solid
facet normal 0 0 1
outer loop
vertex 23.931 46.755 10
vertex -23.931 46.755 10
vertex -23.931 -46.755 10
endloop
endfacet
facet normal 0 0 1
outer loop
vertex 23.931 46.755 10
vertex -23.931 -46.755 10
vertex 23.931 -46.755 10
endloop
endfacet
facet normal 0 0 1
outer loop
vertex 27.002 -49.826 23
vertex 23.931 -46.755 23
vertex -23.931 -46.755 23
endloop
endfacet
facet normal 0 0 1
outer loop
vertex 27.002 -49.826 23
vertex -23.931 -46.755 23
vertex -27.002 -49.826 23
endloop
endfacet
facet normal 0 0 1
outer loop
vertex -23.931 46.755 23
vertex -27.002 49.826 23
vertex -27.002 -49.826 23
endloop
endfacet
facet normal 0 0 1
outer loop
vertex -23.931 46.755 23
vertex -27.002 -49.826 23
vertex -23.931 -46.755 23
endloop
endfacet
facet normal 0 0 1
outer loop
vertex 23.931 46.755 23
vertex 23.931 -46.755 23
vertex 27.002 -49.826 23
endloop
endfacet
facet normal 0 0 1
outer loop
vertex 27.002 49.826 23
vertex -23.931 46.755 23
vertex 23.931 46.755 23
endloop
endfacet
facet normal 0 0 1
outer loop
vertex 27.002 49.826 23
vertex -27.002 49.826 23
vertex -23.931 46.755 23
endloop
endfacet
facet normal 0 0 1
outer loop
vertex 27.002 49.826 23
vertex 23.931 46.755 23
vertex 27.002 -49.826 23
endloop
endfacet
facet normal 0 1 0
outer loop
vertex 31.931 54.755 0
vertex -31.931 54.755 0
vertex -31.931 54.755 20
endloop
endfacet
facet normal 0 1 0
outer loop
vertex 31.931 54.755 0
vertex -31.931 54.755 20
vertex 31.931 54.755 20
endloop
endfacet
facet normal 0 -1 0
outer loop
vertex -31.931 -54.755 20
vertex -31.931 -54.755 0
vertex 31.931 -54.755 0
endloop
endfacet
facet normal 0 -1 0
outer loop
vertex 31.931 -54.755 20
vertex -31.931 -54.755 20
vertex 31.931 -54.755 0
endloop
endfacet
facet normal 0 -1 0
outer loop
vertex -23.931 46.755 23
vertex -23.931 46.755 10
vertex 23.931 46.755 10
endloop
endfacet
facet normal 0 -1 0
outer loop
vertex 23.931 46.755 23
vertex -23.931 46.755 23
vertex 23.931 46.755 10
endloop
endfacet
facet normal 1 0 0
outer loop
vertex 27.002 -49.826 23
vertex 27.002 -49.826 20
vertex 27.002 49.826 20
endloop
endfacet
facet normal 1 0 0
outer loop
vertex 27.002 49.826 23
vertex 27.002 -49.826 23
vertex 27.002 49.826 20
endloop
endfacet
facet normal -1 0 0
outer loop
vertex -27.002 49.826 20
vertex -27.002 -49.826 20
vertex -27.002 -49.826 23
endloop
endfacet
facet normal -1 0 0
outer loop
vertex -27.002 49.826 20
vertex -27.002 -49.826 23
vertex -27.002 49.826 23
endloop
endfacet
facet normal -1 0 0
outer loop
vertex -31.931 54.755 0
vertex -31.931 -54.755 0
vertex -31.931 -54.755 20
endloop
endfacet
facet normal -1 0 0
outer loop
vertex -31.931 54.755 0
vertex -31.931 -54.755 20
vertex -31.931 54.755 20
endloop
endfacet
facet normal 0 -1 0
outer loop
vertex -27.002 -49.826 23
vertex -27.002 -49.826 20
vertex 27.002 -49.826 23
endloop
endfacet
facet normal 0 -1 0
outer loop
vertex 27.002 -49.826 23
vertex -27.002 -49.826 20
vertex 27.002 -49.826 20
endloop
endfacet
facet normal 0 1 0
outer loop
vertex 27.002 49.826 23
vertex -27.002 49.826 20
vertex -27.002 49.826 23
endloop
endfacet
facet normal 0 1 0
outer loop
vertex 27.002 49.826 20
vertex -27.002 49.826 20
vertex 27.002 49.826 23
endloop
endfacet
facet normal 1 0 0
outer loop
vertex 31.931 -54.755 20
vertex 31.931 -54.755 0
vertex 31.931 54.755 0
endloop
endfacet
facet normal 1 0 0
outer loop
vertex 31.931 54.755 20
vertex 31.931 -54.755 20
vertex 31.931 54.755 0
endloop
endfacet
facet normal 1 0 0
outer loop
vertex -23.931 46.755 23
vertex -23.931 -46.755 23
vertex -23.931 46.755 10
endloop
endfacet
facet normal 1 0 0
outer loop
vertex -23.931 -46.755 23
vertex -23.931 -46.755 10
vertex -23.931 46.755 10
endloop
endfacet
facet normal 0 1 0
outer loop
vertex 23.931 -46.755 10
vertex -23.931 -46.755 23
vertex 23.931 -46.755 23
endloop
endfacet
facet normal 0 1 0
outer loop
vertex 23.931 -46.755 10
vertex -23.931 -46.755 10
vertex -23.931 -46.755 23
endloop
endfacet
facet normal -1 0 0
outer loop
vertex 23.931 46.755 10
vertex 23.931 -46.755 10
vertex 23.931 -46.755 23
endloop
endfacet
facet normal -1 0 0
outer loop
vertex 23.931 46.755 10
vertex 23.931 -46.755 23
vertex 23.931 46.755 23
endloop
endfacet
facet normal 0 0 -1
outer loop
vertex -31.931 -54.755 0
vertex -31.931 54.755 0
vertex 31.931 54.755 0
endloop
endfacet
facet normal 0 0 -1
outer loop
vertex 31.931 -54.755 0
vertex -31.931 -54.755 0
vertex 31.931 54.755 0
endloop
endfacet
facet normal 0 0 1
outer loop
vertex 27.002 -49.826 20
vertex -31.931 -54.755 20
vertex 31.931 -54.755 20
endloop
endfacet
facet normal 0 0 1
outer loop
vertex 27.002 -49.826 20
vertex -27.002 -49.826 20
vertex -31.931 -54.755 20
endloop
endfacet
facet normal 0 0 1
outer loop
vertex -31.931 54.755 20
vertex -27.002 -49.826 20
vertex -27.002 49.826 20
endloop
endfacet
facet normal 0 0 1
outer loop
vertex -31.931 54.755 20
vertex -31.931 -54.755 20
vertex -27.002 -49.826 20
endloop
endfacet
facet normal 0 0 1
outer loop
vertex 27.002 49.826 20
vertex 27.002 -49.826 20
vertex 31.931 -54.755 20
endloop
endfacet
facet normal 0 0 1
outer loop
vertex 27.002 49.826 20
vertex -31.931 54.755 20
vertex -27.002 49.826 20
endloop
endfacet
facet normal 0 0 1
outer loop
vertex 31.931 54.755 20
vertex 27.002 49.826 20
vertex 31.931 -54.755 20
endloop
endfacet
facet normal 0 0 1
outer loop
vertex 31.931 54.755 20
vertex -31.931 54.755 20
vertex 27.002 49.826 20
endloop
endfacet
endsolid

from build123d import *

# Parameters (mm, degrees)
F0_W     = 63.8628005981
F0_H     = 109.5097213984
F1_DEPTH = 20
F2_W     = 47.8628005981
F2_H     = 93.5097213984
F3_DEPTH = 10
F4_W     = 54.004792124
F4_H     = 99.651709199
F4_W_2   = 47.8628005981
F4_H_2   = 93.5097213984
F5_DEPTH = 3


with BuildPart() as f1:
    # F0 (on Top) → F1 (new body)
    with BuildSketch(Plane.XY):
        Rectangle(F0_W, F0_H)
    extrude(amount=F1_DEPTH)

    # F2 (on face) → F3 (cut)
    with BuildSketch(Plane.XY.offset(20)):
        Rectangle(F2_W, F2_H)
    extrude(amount=-F3_DEPTH, mode=Mode.SUBTRACT)

    # F4 (on face) → F5 (join)
    with BuildSketch(Plane.XY.offset(20)):
        Rectangle(F4_W, F4_H)
        Rectangle(F4_W_2, F4_H_2, mode=Mode.SUBTRACT)
    extrude(amount=F5_DEPTH)


solid = f1.part
